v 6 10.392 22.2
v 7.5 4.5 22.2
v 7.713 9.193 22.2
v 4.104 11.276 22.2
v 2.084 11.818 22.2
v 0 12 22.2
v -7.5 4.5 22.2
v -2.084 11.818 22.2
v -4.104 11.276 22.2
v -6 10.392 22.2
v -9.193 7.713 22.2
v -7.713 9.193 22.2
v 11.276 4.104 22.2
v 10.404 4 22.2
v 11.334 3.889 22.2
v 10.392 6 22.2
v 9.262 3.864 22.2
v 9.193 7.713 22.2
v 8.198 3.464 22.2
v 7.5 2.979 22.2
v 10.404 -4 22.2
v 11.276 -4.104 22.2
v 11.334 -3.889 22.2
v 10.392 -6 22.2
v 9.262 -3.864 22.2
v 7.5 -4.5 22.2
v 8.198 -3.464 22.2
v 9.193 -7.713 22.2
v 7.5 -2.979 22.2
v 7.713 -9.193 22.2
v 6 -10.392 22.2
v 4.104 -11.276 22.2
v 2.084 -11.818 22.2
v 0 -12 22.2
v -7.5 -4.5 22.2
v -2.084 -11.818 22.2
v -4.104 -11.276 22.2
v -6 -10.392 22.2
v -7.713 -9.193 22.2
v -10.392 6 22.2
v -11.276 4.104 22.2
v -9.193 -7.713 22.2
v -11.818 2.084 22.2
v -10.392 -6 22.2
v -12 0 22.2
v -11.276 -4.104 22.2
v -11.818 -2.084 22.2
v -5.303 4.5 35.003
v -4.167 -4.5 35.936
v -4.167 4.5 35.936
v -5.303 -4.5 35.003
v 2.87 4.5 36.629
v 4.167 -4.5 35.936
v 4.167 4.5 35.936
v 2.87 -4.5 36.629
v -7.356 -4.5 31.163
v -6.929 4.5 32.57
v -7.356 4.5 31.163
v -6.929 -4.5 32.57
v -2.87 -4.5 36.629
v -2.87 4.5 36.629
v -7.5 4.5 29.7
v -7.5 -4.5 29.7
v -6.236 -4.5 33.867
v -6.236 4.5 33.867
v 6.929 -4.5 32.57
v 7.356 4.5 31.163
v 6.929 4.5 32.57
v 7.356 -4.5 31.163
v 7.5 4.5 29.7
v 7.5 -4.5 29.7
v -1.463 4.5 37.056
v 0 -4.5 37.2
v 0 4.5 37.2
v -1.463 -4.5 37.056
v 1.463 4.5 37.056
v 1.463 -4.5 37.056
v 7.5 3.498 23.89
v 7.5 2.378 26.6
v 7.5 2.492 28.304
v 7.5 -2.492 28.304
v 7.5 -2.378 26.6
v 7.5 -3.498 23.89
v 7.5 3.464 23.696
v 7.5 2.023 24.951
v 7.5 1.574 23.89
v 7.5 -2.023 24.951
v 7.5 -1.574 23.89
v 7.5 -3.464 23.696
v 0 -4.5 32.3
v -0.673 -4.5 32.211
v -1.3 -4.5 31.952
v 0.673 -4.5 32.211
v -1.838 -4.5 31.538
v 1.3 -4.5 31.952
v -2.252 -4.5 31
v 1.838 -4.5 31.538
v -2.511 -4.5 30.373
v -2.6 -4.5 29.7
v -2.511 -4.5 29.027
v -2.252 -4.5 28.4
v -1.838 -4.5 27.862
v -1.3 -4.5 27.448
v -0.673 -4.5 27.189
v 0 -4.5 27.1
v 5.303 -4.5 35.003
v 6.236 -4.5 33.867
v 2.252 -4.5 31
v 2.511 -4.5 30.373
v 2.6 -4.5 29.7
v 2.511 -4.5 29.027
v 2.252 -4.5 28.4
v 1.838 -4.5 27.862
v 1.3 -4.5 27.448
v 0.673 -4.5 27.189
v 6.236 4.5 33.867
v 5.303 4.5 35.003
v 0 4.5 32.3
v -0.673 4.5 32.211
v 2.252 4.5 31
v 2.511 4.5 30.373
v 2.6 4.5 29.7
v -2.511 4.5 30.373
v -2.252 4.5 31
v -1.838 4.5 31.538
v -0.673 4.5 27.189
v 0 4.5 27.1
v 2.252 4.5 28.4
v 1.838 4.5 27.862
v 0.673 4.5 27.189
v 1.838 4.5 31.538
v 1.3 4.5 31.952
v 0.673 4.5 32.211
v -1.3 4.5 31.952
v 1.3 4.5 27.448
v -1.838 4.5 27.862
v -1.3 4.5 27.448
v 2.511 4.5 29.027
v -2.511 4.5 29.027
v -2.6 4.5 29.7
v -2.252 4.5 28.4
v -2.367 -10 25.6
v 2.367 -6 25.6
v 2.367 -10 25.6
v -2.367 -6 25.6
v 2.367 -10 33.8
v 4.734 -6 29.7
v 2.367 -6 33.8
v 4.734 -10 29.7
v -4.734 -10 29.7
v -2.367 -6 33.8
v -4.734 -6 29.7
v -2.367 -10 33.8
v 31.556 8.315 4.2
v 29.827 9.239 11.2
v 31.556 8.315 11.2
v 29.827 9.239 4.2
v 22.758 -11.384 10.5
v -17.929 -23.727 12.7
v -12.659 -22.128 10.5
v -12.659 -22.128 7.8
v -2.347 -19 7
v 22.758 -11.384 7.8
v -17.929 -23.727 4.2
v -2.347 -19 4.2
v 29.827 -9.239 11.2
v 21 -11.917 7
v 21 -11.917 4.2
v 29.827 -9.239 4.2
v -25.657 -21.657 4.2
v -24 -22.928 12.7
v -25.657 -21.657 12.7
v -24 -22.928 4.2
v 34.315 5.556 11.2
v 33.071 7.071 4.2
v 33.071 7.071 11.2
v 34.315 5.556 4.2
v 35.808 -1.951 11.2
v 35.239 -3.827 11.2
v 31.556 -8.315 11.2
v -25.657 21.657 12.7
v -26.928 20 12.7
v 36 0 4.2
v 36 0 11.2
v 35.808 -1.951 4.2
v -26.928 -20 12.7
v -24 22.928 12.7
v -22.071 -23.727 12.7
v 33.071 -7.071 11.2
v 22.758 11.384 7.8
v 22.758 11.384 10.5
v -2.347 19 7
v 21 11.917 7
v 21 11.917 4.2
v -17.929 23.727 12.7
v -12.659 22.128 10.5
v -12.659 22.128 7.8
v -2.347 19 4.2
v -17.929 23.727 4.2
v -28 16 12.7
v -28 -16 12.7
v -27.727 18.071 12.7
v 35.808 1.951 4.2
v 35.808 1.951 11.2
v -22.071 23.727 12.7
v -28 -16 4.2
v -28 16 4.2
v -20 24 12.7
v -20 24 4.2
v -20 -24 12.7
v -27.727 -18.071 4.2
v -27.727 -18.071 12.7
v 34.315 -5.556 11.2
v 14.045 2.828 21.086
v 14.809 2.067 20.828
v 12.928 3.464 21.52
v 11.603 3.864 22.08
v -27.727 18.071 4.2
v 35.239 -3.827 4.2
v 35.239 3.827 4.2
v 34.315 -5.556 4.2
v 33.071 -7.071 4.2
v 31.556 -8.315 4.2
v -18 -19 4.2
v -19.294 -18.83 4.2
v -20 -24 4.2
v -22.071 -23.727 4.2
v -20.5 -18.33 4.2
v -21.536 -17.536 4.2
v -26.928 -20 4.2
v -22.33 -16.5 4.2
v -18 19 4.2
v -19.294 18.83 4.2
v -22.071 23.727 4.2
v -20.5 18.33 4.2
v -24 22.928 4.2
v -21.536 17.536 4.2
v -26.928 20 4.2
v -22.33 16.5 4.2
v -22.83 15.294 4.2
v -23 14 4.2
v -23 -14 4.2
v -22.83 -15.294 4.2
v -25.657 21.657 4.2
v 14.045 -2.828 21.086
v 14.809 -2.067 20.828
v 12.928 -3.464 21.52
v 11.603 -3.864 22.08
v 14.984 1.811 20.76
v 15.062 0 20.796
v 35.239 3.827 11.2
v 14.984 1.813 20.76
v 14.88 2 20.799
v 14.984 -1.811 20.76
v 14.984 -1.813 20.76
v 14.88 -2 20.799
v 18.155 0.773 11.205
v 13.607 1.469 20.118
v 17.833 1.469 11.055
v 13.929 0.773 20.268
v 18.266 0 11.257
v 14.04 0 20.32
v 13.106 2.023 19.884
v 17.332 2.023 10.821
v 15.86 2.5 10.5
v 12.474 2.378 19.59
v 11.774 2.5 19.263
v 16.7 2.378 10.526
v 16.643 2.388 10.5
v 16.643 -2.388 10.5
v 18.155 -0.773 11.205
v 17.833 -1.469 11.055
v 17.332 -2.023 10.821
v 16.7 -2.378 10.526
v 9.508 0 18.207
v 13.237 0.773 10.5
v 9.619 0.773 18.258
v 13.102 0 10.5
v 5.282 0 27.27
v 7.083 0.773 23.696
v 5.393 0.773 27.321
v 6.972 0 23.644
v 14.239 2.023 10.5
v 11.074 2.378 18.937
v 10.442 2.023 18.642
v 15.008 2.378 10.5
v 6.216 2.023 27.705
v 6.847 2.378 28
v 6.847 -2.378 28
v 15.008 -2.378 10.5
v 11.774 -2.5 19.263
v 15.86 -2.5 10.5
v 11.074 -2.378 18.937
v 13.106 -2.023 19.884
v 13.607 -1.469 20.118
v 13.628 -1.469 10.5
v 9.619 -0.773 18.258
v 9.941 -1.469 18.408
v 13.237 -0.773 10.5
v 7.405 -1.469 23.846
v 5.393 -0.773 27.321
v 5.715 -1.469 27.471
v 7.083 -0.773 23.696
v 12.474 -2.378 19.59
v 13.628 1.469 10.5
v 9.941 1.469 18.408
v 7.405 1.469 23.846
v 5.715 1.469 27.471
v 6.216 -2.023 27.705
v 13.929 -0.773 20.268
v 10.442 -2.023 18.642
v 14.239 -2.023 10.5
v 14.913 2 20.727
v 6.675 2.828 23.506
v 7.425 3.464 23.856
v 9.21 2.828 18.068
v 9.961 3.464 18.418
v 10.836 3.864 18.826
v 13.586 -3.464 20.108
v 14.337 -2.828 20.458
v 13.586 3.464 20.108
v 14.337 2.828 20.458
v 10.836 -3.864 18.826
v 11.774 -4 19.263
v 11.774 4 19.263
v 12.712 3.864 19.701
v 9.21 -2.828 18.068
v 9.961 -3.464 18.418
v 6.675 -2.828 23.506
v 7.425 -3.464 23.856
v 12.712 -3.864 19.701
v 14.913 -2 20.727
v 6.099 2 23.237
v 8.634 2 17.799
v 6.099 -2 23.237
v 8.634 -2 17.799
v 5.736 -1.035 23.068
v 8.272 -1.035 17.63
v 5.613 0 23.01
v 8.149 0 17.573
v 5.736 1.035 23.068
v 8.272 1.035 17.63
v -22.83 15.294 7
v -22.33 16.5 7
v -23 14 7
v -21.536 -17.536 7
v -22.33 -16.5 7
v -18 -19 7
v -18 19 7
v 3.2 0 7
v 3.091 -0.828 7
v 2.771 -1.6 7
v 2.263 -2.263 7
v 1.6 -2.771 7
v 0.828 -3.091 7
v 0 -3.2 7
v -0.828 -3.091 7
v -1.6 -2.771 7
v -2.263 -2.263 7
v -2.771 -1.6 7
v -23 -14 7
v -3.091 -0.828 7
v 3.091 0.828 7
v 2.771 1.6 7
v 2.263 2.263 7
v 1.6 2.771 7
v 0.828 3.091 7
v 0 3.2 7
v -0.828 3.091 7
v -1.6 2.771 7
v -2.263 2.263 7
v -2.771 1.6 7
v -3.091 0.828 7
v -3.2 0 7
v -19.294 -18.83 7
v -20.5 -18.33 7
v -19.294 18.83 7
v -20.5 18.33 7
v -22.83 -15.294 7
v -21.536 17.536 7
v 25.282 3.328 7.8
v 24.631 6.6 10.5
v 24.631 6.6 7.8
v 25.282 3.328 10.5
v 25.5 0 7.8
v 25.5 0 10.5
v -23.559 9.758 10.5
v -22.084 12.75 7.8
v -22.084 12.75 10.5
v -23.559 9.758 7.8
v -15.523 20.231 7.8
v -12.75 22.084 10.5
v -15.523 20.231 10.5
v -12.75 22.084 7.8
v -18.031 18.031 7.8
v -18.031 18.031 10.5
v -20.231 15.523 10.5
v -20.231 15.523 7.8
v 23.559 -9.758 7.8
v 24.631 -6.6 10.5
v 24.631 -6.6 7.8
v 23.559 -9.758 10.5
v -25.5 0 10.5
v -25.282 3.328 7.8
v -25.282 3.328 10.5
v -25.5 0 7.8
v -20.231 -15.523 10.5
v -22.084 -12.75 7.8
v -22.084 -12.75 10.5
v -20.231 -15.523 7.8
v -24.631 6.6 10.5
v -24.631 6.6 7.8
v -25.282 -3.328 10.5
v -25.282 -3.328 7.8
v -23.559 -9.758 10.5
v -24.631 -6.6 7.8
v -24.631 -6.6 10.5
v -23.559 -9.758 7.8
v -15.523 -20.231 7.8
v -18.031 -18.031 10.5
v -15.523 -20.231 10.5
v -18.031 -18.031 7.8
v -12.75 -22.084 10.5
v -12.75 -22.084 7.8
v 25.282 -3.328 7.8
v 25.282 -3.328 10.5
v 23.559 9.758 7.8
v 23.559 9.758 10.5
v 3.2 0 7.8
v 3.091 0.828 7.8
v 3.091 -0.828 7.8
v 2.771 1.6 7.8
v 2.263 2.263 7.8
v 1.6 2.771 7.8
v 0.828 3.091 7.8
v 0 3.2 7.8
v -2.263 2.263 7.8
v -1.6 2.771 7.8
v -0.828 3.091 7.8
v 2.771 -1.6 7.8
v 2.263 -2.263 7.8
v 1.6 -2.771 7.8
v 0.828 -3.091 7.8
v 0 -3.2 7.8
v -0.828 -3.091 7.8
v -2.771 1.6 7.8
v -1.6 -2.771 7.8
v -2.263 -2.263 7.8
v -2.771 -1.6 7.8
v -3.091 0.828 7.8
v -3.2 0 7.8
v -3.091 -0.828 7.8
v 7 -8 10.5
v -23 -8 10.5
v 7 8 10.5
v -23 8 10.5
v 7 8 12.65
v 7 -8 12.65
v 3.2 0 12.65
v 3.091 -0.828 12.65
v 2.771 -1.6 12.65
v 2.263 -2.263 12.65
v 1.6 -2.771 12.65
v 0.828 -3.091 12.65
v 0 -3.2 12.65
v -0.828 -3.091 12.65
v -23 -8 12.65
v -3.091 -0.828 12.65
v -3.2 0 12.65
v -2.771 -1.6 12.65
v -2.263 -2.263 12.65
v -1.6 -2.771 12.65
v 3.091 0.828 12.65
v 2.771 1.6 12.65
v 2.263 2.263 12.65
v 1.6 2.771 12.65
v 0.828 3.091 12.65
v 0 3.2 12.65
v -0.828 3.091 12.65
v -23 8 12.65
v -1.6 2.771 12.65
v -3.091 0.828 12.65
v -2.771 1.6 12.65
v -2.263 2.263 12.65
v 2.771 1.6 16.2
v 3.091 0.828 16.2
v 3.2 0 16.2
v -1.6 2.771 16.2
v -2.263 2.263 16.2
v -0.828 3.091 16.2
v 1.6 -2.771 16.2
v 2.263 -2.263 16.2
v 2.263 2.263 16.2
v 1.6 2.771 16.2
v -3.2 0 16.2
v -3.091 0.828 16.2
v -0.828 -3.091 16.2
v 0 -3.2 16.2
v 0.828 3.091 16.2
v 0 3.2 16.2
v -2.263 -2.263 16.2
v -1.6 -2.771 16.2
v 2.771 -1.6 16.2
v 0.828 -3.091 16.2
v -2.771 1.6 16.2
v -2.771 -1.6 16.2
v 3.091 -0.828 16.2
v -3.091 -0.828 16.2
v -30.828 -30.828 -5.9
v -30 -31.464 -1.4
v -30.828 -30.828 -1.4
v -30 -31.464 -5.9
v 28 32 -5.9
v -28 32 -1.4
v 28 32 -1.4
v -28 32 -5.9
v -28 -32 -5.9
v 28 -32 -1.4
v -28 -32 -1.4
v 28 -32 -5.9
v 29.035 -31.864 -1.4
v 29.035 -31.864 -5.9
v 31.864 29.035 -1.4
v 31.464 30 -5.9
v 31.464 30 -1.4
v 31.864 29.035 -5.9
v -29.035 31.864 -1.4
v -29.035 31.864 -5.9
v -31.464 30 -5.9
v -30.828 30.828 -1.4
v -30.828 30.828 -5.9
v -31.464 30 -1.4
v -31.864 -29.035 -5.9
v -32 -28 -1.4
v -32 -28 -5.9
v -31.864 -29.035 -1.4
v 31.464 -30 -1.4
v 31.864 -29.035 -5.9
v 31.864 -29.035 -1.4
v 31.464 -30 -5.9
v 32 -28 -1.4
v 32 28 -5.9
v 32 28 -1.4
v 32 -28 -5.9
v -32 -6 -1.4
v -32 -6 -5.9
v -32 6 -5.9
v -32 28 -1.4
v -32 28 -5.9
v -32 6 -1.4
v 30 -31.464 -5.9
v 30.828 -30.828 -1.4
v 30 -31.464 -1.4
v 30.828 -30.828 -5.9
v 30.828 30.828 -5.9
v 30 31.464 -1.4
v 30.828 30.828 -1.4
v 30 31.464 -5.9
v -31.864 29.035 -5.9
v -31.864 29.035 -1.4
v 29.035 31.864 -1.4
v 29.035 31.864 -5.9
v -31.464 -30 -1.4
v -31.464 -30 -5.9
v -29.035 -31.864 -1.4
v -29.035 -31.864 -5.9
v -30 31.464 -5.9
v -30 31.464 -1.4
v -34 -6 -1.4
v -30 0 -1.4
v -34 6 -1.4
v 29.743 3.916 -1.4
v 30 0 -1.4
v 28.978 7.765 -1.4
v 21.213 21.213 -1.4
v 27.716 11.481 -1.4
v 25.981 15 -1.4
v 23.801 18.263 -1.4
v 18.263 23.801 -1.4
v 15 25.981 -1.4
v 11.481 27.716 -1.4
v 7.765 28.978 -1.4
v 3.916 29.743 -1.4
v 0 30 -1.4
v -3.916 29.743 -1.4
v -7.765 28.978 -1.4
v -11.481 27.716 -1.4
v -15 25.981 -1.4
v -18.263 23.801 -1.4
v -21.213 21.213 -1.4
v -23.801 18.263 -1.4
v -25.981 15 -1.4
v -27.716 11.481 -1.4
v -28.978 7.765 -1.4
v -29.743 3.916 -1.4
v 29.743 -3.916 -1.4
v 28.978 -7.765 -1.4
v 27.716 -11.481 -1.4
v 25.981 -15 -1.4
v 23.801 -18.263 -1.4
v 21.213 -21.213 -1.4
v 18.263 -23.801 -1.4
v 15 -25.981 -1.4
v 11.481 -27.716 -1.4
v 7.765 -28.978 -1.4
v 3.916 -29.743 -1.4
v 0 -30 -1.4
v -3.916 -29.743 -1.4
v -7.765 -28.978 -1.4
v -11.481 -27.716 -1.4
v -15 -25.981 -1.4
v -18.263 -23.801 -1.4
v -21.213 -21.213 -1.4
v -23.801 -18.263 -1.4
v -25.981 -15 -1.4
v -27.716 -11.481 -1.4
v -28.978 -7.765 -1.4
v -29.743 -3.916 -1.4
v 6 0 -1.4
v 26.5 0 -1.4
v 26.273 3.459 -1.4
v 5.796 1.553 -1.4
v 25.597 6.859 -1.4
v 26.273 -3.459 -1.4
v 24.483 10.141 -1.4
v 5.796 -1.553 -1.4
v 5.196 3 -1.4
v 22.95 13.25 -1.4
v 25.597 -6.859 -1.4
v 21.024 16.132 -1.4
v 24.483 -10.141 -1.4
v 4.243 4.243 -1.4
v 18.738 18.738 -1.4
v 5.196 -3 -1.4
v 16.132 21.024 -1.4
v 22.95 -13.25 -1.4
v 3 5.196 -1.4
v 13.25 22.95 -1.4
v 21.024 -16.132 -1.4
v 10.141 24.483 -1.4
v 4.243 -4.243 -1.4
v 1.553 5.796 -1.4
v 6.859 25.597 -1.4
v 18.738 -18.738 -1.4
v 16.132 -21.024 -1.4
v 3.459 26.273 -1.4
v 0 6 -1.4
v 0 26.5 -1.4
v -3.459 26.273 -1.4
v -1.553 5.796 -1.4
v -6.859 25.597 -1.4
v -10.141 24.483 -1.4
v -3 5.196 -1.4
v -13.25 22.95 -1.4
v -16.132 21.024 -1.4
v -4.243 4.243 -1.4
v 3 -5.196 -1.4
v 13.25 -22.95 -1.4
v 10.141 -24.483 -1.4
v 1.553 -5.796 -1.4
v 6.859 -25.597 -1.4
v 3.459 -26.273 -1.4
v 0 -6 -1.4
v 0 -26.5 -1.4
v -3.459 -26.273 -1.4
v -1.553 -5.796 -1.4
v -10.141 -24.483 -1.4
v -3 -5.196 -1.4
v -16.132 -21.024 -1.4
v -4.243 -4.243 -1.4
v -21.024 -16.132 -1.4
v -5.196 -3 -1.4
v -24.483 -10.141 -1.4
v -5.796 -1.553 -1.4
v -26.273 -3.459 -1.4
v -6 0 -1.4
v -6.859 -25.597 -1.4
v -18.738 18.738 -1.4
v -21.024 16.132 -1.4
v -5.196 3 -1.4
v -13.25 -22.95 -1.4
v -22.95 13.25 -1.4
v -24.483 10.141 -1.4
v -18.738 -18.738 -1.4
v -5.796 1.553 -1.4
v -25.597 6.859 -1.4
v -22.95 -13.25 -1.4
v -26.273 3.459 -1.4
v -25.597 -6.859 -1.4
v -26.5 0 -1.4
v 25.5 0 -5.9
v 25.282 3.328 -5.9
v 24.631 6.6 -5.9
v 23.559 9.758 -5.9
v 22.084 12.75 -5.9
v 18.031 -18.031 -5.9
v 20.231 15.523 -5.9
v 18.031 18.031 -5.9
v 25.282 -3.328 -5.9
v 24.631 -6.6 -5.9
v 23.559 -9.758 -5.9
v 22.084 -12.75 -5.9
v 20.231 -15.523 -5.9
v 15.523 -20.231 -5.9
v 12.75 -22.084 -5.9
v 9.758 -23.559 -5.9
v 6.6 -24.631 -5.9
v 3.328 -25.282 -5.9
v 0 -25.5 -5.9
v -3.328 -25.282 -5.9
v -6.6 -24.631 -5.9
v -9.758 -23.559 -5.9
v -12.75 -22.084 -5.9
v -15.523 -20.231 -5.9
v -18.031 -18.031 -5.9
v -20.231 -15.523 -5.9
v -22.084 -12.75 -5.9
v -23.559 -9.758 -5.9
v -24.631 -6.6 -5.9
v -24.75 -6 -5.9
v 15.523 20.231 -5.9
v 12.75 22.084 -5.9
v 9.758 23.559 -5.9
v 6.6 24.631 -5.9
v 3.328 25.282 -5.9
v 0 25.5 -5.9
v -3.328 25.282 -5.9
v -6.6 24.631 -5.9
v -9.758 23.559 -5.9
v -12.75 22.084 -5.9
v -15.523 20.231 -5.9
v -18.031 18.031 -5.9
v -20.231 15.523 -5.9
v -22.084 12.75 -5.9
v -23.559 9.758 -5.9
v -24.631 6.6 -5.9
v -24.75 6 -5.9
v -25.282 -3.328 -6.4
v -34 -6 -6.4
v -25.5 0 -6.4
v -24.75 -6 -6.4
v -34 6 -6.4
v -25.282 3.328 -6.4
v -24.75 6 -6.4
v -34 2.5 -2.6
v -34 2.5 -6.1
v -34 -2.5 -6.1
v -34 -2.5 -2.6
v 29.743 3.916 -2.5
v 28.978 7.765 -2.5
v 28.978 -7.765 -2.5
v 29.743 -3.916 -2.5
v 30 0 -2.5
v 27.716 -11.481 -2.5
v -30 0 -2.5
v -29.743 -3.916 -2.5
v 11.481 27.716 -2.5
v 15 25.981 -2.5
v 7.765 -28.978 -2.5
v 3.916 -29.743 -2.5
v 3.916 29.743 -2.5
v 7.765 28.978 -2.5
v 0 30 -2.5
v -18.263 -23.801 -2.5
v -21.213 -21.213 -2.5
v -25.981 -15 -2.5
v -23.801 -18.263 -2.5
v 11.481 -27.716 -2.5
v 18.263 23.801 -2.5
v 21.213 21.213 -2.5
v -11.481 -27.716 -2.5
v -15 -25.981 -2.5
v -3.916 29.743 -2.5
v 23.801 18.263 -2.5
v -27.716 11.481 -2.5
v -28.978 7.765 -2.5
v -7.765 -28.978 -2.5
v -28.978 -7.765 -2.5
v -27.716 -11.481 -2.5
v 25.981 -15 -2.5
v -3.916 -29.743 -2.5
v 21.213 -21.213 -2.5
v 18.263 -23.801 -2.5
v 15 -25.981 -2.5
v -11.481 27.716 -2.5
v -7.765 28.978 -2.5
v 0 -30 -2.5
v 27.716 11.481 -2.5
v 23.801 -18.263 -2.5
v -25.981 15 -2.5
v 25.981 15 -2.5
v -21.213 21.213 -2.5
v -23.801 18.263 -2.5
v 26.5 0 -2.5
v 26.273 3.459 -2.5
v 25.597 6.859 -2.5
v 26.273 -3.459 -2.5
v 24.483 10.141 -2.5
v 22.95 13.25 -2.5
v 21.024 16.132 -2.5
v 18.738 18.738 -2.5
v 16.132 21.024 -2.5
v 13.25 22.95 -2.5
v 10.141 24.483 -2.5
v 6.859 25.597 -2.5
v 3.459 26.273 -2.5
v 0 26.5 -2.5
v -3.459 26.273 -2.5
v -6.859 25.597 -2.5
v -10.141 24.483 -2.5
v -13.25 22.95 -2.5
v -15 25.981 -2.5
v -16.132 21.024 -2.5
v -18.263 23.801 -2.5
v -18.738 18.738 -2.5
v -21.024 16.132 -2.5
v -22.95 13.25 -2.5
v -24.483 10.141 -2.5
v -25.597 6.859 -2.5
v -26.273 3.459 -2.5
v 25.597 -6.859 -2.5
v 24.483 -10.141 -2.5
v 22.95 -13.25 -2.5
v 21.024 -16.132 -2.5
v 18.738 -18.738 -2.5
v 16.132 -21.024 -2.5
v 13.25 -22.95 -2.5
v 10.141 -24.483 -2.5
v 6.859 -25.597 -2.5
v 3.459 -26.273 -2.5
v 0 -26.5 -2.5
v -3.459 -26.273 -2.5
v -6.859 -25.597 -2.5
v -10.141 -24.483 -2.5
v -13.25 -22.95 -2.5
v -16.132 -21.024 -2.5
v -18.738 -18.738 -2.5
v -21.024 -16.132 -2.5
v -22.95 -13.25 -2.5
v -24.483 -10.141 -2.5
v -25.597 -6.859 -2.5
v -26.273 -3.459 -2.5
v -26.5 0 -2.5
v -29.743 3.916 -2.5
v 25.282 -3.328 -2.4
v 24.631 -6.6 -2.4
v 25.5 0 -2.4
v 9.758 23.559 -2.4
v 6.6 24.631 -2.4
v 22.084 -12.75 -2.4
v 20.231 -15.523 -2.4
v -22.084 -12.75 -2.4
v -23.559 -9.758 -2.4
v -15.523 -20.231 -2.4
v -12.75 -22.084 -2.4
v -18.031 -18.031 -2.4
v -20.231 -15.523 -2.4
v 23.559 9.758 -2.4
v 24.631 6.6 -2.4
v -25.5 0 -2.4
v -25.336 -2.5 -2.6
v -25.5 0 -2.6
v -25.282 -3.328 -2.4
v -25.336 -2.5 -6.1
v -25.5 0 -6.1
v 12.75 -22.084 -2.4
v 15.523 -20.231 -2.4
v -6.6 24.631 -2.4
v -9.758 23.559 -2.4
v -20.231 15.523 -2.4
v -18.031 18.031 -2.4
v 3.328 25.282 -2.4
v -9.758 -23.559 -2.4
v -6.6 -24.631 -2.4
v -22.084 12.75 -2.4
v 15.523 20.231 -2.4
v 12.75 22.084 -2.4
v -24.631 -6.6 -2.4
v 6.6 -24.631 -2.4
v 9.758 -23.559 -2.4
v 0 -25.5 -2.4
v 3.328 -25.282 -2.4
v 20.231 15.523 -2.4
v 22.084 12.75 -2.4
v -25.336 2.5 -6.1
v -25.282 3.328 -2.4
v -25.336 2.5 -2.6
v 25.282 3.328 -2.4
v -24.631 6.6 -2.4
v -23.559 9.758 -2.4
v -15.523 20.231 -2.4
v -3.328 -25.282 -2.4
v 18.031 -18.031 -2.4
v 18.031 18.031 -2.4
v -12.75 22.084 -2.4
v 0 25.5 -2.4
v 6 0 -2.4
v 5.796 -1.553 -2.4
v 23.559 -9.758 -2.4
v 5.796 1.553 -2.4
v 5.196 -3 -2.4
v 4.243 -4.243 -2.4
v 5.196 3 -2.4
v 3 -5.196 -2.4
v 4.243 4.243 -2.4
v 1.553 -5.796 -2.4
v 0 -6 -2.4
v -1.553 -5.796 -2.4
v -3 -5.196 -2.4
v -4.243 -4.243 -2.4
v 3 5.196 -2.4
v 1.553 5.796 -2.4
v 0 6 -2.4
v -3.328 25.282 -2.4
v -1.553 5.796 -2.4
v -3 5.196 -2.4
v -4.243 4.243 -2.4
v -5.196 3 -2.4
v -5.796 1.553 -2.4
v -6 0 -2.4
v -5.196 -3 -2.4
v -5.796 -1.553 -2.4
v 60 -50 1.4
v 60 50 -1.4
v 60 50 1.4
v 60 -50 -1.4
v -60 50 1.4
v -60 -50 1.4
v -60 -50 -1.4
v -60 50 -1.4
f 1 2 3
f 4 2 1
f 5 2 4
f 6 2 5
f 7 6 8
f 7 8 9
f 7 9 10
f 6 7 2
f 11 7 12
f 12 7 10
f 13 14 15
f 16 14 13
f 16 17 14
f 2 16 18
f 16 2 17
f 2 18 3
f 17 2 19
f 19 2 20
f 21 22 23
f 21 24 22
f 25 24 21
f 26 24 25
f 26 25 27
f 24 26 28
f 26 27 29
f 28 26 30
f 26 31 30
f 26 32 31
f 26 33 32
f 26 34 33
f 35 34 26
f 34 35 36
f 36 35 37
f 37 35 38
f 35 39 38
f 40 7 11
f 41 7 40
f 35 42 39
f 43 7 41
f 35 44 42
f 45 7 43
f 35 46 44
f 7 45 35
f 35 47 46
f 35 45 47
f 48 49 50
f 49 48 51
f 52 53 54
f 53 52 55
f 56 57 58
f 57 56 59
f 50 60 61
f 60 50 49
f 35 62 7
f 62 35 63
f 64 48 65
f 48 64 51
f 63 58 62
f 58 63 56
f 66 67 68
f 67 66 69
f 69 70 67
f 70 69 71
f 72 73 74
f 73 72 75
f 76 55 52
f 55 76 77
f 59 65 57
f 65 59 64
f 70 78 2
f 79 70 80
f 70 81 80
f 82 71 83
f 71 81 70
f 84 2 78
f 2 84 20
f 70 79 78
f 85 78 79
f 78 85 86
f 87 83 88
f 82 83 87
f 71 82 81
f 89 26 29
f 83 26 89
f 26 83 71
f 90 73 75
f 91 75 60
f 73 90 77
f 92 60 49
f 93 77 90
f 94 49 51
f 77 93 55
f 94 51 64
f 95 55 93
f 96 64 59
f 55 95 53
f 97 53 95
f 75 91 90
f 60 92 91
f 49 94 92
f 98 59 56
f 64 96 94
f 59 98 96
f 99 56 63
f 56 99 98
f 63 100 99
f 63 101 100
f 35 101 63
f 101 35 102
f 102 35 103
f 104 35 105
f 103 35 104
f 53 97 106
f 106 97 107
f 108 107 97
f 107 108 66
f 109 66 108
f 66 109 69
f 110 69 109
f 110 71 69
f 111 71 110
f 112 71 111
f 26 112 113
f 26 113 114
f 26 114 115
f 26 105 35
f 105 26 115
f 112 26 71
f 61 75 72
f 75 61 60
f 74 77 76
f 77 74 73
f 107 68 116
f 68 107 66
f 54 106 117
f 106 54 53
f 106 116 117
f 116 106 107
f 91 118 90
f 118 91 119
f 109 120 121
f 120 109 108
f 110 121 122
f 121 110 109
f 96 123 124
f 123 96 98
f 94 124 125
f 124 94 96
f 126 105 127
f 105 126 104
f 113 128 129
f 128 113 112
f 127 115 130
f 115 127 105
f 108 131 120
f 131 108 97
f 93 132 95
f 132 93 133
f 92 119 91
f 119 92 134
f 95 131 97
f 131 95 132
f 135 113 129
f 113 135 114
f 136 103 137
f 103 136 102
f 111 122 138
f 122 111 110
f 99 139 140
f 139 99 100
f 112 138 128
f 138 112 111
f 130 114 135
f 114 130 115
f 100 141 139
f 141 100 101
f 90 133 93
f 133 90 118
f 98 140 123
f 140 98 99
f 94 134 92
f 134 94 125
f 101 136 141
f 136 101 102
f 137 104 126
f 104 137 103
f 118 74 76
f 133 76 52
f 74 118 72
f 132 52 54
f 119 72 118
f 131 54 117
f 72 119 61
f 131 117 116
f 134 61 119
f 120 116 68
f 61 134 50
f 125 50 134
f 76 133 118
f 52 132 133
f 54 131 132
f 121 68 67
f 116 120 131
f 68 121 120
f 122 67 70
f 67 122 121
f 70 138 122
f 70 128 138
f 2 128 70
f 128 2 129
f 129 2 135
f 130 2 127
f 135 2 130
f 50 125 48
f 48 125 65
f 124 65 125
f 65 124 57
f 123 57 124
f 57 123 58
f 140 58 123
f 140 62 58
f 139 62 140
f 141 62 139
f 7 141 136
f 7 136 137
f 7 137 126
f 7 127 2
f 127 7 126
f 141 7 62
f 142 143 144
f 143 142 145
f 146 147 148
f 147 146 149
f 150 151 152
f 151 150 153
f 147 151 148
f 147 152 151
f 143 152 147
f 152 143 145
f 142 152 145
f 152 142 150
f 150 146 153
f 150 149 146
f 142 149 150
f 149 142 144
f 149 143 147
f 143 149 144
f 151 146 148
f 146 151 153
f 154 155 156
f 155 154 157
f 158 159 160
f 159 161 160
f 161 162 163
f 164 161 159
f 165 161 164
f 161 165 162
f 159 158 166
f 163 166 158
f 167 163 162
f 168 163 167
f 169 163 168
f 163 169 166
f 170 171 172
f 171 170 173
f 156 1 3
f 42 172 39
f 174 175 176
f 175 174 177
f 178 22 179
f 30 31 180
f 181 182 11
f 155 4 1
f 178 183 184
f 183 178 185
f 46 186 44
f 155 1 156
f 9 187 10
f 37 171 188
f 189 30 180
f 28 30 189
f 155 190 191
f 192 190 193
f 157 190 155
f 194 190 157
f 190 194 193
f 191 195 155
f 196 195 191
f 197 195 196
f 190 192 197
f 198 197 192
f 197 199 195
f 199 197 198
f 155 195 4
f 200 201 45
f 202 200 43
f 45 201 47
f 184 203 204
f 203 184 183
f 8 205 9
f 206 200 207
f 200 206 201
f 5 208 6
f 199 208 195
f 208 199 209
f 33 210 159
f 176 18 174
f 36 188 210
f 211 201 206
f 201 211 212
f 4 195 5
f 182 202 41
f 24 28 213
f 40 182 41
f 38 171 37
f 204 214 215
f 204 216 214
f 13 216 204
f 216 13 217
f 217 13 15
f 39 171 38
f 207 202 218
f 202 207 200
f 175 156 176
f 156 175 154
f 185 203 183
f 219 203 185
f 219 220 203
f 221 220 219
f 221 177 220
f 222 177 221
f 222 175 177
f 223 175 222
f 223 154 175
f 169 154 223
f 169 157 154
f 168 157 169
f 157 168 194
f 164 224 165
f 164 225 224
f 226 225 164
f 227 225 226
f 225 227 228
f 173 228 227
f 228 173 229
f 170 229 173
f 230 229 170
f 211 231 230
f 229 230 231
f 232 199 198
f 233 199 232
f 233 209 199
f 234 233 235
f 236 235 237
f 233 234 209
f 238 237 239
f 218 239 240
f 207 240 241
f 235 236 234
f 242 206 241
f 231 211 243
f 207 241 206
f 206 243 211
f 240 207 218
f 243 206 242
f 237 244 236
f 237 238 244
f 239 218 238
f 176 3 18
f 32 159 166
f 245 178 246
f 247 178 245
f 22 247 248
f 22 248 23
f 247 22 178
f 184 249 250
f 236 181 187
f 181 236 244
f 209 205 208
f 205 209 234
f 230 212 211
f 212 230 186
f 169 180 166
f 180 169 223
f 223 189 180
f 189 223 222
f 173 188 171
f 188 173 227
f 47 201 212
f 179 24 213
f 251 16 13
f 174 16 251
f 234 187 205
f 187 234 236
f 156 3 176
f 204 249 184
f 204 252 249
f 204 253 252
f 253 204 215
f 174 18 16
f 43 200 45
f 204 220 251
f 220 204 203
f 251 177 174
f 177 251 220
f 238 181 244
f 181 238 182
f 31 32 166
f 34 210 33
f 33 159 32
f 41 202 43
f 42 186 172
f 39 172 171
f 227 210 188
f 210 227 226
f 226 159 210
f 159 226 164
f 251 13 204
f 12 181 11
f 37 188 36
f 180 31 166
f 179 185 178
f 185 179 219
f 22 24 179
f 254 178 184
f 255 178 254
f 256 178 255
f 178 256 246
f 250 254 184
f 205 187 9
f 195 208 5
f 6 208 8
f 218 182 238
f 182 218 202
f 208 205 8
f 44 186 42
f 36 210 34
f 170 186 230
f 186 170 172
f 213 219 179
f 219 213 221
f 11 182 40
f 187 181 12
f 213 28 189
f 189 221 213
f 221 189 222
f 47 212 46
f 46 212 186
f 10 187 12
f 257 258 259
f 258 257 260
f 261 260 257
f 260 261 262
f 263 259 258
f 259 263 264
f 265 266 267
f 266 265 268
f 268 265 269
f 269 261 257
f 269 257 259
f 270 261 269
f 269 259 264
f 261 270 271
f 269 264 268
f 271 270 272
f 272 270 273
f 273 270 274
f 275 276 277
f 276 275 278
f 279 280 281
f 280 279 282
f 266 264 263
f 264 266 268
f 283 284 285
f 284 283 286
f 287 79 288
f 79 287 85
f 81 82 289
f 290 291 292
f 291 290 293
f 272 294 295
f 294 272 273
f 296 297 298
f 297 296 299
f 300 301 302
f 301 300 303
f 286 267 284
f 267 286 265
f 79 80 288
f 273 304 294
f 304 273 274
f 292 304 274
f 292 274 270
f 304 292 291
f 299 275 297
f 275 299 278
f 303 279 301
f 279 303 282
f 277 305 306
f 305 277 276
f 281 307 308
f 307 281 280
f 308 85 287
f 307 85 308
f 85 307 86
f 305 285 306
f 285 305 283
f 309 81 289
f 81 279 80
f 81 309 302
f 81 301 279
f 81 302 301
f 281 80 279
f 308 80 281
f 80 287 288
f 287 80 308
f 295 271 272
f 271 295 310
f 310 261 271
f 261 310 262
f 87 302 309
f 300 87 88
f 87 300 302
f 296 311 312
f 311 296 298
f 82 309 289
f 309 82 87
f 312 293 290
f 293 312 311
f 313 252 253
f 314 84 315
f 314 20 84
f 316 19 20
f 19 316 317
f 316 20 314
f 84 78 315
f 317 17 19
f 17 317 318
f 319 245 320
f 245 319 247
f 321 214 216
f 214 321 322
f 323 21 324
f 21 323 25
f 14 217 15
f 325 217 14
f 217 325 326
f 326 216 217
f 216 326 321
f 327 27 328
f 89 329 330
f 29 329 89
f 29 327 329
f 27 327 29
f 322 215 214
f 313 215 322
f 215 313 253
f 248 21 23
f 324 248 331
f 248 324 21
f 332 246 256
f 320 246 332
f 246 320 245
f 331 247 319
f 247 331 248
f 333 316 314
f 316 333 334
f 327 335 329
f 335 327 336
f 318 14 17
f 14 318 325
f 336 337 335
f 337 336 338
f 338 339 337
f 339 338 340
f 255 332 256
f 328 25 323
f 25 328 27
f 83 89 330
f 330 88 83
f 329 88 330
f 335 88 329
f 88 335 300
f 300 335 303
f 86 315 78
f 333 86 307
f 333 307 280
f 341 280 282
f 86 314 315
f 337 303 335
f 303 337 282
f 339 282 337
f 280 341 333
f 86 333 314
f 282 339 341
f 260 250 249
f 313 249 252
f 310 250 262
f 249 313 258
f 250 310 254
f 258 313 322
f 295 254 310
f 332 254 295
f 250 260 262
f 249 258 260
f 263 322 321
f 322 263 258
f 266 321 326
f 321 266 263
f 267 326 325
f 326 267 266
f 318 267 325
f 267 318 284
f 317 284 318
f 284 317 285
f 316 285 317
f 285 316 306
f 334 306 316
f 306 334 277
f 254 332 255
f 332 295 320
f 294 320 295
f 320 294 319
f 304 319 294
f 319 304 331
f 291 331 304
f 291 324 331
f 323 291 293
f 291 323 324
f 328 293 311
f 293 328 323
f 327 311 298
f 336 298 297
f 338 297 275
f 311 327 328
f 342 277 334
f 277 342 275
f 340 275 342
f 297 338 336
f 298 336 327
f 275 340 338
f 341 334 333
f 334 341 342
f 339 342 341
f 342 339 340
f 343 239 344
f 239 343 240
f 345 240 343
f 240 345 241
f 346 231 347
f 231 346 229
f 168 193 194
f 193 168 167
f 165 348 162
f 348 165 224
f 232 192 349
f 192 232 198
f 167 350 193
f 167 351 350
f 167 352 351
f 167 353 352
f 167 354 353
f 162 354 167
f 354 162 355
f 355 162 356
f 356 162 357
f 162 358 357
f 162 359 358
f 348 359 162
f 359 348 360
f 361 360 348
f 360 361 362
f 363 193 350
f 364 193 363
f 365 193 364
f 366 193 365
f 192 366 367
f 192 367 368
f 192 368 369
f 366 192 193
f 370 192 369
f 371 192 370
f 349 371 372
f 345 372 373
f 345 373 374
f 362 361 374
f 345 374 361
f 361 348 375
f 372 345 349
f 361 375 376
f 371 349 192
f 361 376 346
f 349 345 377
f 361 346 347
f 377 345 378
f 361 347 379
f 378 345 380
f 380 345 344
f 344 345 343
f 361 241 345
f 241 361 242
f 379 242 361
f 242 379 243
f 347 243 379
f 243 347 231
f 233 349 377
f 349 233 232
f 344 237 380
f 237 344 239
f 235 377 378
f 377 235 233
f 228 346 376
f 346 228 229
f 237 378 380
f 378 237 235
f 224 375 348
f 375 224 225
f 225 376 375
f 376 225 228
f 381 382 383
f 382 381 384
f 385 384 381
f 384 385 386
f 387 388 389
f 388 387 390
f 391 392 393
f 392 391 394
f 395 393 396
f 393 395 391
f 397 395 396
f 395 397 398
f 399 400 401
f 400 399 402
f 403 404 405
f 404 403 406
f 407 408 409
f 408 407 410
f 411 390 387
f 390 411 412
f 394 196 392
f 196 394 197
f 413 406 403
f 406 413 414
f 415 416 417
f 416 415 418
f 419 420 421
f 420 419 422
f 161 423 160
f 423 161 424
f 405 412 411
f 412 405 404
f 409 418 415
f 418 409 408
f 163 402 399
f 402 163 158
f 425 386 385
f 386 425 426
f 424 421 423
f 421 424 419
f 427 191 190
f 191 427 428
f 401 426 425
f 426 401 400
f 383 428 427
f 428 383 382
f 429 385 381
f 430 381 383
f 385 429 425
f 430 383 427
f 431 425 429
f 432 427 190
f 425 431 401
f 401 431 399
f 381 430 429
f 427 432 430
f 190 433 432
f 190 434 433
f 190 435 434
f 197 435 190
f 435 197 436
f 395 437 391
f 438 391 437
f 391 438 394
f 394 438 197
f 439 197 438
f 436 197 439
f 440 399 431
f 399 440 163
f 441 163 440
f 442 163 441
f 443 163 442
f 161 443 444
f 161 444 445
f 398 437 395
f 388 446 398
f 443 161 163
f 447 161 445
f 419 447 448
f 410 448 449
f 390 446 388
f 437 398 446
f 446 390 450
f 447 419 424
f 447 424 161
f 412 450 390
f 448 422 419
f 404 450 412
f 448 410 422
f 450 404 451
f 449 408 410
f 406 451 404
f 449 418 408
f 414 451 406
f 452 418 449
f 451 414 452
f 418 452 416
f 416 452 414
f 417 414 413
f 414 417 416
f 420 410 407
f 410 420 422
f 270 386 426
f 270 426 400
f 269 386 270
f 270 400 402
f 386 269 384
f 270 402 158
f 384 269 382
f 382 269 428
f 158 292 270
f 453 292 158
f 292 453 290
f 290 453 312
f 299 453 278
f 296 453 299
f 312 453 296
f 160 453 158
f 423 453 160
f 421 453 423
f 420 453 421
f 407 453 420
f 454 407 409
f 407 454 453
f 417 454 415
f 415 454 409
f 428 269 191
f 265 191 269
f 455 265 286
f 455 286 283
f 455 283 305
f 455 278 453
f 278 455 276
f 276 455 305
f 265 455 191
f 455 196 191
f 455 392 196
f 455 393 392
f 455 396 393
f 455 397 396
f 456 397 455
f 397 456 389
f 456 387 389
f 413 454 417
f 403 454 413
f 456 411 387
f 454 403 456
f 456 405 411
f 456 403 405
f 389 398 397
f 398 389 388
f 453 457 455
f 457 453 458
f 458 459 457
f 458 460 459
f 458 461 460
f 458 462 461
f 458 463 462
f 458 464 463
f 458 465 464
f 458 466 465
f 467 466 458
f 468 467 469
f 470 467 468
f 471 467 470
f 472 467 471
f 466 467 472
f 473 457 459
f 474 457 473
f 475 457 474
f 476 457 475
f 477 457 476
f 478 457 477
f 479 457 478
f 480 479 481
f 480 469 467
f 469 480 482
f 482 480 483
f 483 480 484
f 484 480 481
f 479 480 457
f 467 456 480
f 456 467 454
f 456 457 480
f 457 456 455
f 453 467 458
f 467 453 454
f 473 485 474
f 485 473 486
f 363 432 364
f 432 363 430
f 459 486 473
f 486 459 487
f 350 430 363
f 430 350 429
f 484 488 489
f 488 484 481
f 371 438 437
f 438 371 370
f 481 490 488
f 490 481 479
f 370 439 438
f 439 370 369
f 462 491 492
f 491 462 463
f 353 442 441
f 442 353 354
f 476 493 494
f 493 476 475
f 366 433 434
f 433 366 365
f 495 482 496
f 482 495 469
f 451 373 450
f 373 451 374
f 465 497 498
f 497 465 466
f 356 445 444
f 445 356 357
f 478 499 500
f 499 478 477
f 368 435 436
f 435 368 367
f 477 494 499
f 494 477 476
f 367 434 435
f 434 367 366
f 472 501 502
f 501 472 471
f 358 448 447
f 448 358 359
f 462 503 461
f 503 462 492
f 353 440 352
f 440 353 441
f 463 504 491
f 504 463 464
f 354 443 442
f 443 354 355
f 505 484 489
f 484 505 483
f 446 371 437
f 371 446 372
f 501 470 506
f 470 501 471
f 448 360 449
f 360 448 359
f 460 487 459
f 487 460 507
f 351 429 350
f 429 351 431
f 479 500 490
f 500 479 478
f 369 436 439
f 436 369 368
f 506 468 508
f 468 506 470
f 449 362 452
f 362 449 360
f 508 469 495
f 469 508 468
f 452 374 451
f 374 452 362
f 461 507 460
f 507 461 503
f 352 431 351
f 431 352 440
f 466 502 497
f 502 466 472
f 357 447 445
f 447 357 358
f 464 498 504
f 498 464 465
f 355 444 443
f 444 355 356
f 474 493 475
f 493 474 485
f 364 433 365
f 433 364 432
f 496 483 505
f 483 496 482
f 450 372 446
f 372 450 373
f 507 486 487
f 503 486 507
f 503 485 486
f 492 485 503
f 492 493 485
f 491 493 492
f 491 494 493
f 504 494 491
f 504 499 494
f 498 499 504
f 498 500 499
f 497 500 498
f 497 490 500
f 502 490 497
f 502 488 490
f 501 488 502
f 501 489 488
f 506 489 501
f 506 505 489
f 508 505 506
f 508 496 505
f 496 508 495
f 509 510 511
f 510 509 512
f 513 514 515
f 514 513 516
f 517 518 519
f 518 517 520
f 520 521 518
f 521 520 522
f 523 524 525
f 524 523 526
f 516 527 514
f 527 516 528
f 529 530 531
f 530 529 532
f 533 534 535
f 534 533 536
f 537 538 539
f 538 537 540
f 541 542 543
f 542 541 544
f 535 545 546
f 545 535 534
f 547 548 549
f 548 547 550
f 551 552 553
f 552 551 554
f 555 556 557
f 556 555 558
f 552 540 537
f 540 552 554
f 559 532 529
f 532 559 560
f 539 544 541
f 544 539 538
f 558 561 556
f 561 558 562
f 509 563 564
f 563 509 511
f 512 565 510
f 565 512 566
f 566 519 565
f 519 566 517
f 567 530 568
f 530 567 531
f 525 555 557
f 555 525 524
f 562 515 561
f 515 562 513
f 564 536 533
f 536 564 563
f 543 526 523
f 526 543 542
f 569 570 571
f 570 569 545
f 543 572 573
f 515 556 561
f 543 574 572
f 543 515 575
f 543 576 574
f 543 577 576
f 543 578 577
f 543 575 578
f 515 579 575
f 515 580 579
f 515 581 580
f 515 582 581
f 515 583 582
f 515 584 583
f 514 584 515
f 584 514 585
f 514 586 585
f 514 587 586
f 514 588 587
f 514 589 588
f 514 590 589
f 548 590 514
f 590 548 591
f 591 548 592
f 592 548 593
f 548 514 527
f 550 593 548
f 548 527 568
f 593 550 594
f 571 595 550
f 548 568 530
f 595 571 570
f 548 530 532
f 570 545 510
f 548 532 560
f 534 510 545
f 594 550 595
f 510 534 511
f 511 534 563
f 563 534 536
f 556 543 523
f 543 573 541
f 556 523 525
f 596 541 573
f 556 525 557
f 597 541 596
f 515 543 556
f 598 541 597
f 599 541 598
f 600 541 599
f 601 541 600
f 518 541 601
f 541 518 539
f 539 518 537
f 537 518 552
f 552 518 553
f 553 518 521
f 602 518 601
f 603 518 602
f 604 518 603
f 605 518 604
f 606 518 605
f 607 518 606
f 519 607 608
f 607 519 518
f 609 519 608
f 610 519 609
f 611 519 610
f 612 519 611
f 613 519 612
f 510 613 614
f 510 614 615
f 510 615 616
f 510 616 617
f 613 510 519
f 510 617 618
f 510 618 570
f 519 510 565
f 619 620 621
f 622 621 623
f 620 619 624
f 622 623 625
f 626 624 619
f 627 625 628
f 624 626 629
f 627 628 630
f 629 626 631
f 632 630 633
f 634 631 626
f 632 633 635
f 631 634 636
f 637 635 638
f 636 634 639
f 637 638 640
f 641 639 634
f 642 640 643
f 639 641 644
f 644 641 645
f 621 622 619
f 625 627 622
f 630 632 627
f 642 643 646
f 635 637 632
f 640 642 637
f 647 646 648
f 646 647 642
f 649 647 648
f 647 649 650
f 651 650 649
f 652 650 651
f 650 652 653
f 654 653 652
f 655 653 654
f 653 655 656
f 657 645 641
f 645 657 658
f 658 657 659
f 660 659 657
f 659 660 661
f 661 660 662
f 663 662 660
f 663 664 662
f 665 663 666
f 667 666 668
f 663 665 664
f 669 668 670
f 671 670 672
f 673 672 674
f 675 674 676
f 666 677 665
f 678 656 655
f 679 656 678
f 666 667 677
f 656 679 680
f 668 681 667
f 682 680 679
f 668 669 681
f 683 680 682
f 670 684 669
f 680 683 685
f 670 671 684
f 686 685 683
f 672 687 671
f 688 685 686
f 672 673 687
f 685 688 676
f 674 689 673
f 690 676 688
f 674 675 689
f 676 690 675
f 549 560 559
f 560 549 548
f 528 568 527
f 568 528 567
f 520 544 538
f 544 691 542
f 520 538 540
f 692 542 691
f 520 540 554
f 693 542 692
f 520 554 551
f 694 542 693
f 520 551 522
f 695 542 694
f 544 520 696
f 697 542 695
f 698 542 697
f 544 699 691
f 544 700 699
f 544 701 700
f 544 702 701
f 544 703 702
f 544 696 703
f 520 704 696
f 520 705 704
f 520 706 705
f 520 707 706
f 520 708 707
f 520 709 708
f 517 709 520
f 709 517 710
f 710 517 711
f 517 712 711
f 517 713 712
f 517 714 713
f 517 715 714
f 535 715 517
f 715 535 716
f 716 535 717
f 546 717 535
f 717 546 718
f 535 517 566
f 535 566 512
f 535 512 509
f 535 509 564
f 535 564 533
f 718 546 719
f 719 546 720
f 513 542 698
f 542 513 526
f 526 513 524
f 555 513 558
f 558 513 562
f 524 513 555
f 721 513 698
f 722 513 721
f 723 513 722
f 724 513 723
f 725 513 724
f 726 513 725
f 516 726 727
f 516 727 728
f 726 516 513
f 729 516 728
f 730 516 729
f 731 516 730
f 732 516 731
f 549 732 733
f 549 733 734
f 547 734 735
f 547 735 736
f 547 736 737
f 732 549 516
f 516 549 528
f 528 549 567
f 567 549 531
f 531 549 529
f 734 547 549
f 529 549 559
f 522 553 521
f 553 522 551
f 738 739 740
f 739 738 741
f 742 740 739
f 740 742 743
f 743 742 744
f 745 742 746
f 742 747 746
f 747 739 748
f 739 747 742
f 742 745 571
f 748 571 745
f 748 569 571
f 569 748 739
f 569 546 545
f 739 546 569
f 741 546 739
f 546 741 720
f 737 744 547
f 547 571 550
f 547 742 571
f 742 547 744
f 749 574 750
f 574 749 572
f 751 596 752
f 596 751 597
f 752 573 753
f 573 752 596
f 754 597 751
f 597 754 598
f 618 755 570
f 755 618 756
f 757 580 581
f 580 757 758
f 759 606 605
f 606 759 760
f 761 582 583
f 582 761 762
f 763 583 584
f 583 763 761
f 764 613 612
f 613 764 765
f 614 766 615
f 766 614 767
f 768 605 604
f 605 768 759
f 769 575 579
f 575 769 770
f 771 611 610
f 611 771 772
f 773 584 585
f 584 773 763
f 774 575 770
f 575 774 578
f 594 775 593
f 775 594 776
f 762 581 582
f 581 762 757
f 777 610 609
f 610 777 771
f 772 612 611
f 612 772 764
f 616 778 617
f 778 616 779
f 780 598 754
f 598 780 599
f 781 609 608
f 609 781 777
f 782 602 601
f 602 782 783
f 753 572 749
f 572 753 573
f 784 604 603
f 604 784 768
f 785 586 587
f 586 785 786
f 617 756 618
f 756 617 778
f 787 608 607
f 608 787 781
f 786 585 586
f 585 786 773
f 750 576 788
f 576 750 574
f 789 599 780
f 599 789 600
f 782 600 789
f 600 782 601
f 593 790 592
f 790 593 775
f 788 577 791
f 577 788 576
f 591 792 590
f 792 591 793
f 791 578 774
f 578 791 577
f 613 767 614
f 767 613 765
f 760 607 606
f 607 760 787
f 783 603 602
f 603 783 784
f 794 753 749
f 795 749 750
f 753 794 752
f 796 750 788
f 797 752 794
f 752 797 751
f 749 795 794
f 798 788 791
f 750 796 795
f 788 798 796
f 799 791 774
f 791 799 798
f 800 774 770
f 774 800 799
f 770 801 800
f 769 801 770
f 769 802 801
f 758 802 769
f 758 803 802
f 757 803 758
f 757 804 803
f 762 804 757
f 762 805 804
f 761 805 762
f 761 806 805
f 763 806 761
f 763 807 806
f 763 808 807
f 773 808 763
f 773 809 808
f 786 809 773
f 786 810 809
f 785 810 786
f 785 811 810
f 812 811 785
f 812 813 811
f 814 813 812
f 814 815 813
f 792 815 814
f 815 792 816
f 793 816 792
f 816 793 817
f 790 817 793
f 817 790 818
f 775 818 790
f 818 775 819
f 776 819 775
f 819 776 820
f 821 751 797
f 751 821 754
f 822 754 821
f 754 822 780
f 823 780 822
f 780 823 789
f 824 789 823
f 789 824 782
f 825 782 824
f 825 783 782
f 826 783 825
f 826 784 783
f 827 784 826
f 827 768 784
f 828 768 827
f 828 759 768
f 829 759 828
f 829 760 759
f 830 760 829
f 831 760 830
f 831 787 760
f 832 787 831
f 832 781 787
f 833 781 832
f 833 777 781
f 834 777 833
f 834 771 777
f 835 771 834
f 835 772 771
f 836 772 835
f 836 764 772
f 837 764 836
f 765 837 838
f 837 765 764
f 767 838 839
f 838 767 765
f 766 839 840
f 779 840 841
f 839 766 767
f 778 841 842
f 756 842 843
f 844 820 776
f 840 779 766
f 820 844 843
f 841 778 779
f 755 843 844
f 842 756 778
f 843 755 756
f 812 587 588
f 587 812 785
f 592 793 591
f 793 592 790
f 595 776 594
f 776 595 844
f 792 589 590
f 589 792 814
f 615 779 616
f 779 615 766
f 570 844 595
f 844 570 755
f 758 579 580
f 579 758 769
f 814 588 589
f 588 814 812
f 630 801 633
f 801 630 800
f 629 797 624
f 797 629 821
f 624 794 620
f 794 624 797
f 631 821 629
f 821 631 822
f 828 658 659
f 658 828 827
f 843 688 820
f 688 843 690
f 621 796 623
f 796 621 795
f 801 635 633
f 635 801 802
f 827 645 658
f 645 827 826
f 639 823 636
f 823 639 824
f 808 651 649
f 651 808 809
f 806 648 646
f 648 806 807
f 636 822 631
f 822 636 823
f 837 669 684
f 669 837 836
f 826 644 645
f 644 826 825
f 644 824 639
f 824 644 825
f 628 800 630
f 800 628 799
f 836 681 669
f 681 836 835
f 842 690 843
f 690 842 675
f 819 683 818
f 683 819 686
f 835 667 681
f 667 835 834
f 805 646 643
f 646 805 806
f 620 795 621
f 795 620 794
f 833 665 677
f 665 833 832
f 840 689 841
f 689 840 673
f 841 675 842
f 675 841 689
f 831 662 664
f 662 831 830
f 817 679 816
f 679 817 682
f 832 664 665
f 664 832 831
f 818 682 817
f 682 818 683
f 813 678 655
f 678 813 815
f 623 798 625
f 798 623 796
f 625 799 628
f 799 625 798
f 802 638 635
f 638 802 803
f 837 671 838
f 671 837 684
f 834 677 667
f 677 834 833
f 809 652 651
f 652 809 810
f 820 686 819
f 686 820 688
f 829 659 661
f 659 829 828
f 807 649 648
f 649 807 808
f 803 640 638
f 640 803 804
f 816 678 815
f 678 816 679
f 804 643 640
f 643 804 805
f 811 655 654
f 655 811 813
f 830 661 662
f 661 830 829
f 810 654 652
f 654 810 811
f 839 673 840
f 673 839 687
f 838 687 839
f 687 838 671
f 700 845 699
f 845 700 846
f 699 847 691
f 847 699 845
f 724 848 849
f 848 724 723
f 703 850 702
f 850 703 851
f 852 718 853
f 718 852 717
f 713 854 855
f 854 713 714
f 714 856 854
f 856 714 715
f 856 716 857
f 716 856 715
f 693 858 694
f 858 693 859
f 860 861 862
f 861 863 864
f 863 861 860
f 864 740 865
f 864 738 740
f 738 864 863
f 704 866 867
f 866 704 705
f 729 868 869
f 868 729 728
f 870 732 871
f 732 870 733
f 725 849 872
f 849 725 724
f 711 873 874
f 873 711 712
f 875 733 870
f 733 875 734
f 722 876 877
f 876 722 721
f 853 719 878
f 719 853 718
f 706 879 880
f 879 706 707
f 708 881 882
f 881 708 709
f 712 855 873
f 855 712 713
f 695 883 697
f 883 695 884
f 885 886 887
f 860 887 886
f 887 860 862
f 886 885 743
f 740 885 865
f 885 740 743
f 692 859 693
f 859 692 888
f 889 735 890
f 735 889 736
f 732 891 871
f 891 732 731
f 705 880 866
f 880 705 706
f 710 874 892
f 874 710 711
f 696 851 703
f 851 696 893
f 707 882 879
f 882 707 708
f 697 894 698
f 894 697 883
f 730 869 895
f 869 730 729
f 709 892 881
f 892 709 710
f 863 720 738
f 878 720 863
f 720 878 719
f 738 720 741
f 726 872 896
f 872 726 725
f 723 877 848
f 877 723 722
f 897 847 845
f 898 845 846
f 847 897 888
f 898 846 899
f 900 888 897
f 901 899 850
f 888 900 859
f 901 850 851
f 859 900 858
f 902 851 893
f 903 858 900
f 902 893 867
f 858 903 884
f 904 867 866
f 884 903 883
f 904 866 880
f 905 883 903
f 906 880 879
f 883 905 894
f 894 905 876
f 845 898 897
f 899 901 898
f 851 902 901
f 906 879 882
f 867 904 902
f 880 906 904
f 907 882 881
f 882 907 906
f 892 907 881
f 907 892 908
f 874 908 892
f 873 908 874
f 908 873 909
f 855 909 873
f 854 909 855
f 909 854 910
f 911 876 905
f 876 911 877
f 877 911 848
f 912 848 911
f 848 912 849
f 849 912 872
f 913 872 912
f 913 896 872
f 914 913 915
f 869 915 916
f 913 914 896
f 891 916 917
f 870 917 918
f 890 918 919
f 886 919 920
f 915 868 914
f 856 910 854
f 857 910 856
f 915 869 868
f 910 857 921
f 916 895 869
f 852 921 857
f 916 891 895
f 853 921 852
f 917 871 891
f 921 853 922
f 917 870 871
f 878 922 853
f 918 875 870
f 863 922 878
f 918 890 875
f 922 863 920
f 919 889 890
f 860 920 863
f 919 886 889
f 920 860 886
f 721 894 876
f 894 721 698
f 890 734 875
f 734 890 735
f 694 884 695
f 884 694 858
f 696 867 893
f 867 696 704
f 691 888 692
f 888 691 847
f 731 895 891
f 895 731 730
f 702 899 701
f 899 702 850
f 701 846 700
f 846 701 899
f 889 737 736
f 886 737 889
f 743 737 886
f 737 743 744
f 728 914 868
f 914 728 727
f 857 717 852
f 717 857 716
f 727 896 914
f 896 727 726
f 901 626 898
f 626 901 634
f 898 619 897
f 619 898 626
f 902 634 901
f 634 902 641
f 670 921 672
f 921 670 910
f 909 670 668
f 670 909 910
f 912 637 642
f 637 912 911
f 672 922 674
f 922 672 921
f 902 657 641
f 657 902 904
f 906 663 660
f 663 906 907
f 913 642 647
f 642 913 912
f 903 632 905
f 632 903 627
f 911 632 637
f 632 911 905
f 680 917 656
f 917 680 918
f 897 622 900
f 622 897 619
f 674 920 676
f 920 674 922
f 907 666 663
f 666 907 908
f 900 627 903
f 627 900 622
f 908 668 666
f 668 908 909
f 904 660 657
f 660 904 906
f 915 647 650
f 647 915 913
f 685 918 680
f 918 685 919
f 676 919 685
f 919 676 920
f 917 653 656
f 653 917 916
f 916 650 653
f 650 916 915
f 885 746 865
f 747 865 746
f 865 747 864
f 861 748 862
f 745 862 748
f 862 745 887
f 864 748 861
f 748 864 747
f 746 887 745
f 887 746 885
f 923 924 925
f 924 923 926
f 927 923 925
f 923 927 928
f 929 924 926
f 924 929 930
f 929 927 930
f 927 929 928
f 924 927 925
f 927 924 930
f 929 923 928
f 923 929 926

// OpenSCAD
// =============================================================================
// OpenMotorBridge - Road Glide ST Through-Fairing Inductive Cam Dock (Qi IPT)
// =============================================================================
// File: hardware/cad/scad/05_accessories/road_glide_inductive_cam_dock.scad
// Description: Zero-drill, zero-external-wire continuous power docking system
//              for action cams (Insta360 X3/X4, GoPro) on Harley Sharknose fairings:
//              1. Inner TX Cradle (mounted under outer fairing deck behind headlamp)
//                 holds 15W Qi transmitter coil pressed against inner ABS surface.
//              2. Outer Cam Dock with 3M Dual Lock SJ3550 base, internal Qi RX coil
//                 (TI BQ51013B 5V/2A), 30mm ultra-short USB-C pigtail to camera,
//                 and universal 3-prong action-cam / 1/4"-20 tripod mounting head.
//              3. Pure magnetic inductive coupling through 2.5 - 3.0 mm ABS deck.
//                 100% factory paint preserved, 100% weatherproof, zero holes!
// =============================================================================

include <../00_common/parameters.scad>;

// --- Fairing & Electromagnetic Parameters ---
FAIRING_ABS_THICK   = 2.8;   // Nominal Road Glide ST outer fairing deck thickness (mm)
QI_COIL_DIA         = 50.0;  // Standard 15W Qi inductive ferrite coil diameter (mm)
QI_COIL_THICK       = 2.2;   // Coil + ferrite shield backing thickness (mm)
QI_RX_PCB_L         = 28.0;  // Rectifier / step-down converter board length (mm)
QI_RX_PCB_W         = 15.0;  // Rectifier board width (mm)

// --- Outer Dock Mechanical Parameters ---
DOCK_OUTER_L        = 64.0;  // Longitudinal length of aerodynamic dock base (mm)
DOCK_OUTER_W        = 56.0;  // Transverse width of dock base (mm)
DOCK_OUTER_H        = 18.0;  // Overall height from fairing deck to camera pivot (mm)
DUAL_LOCK_RECESS_D  = 2.8;   // Recess depth for 3M Dual Lock SJ3550 interlocking tape (mm)

// 1. Inner TX Coil Cradle (Glued inside fairing deck behind headlamp)
module road_glide_inner_qi_tx_cradle() {
    difference() {
        union() {
            // Mounting flange plate with rounded corners
            hull() {
                for (dx = [-28.0, 28.0]) {
                    for (dy = [-28.0, 28.0]) {
                        translate([dx, dy, 0])
                            cylinder(r=4.0, h=4.5, center=false, $fn=24);
                    }
                }
            }
            // Cable strain relief snout
            translate([-34.0, -6.0, 0])
                cube([12.0, 12.0, 5.0], center=false);
        }

        // Circular pocket for 15W Qi TX coil + ferrite disc
        translate([0, 0, 1.0])
            cylinder(r=QI_COIL_DIA/2.0 + 0.5, h=QI_COIL_THICK + 2.0, center=false, $fn=48);

        // Center thermal breather / alignment port
        cylinder(r=6.0, h=10.0, center=true, $fn=24);

        // Power wire routing groove to Front-Node Port 1 (PD 12V/9V)
        translate([-36.0, -2.5, 1.2])
            cube([25.0, 5.0, 3.5], center=false);

        // Perimeter 3M VHB bonding adhesive tape channels (1.0 mm deep)
        difference() {
            translate([0, 0, -0.1])
                cylinder(r=30.0, h=1.2, center=false, $fn=48);
            translate([0, 0, -0.2])
                cylinder(r=26.5, h=1.5, center=false, $fn=48);
        }
    }
}

// 2. Outer Quick-Release Inductive Action Cam Dock
module road_glide_outer_qi_cam_dock() {
    difference() {
        union() {
            // Aerodynamic teardrop / rounded wedge outer housing
            hull() {
                // Front aerodynamic nose
                translate([DOCK_OUTER_L/2.0 - 6.0, 0, 0])
                    cylinder(r=10.0, h=7.0, center=false, $fn=32);
                // Rear body
                translate([-DOCK_OUTER_L/2.0 + 12.0, -DOCK_OUTER_W/2.0 + 12.0, 0])
                    cylinder(r=8.0, h=8.5, center=false, $fn=24);
                translate([-DOCK_OUTER_L/2.0 + 12.0,  DOCK_OUTER_W/2.0 - 12.0, 0])
                    cylinder(r=8.0, h=8.5, center=false, $fn=24);
                // Upper camera mounting tower
                translate([0, 0, DOCK_OUTER_H - 4.0])
                    cylinder(r=12.0, h=4.0, center=false, $fn=36);
            }

            // Universal Action Camera 3-Prong Mounting Clevis
            translate([0, 0, DOCK_OUTER_H]) {
                for (prong_y = [-4.5, 1.5]) {
                    translate([-7.5, prong_y, 0]) {
                        difference() {
                            hull() {
                                cube([15.0, 3.0, 7.5], center=false);
                                translate([7.5, 1.5, 7.5])
                                    rotate([90, 0, 0])
                                        cylinder(r=7.5, h=3.0, center=true, $fn=32);
                            }
                            // M5 Bolt Pivot Bore
                            translate([7.5, 1.5, 7.5])
                                rotate([90, 0, 0])
                                    cylinder(r=2.6, h=6.0, center=true, $fn=24);
                        }
                    }
                }
                // Center prong
                translate([-7.5, -1.5, 0]) {
                    difference() {
                        hull() {
                            cube([15.0, 3.0, 7.5], center=false);
                            translate([7.5, 1.5, 7.5])
                                rotate([90, 0, 0])
                                    cylinder(r=7.5, h=3.0, center=true, $fn=32);
                        }
                        translate([7.5, 1.5, 7.5])
                            rotate([90, 0, 0])
                                cylinder(r=2.6, h=6.0, center=true, $fn=24);
                    }
                }
                // M5 Acorn Nut Captive Hex Pocket (on left flank)
                translate([0, -8.0, 7.5])
                    rotate([90, 0, 0])
                        cylinder(r=NUT_M5_SW/cos(30)/2, h=4.0, center=true, $fn=6);
            }
        }

        // --- SUBTRACTIONS ---

        // A. Bottom 3M Dual Lock SJ3550 Interlocking Tape Recess (ensures flush mount)
        translate([0, 0, -0.1]) {
            hull() {
                for (dx = [-DOCK_OUTER_L/2.0 + 14.0, DOCK_OUTER_L/2.0 - 16.0]) {
                    for (dy = [-DOCK_OUTER_W/2.0 + 14.0, DOCK_OUTER_W/2.0 - 14.0]) {
                        translate([dx, dy, 0])
                            cylinder(r=5.0, h=DUAL_LOCK_RECESS_D + 0.1, center=false, $fn=24);
                    }
                }
            }
        }

        // B. Internal Qi Receiver Coil Cavity (centered right above Dual Lock floor)
        translate([0, 0, DUAL_LOCK_RECESS_D + 0.8])
            cylinder(r=QI_COIL_DIA/2.0 + 0.5, h=QI_COIL_THICK + 0.5, center=false, $fn=48);

        // C. Internal Rectifier & 5V/2A Step-Down PCB Pocket (TI BQ51013B)
        translate([-8.0, 0, DUAL_LOCK_RECESS_D + QI_COIL_THICK + 1.2])
            cube([QI_RX_PCB_L + 2.0, QI_RX_PCB_W + 1.0, 4.5], center=true);

        // D. Ultra-Short 30mm USB-C Cable Exit Port (Angled upward towards camera port)
        translate([16.0, 0, 6.0]) {
            rotate([0, -25, 0]) {
                cylinder(r=2.5, h=20.0, center=false, $fn=20); // Ø 5mm cable passage
                translate([0, 0, 10.0])
                    cylinder(r=4.0, h=6.0, center=false, $fn=24); // TPU strain relief boot recess
            }
        }

        // E. Standard 1/4"-20 Threaded Brass Bushing Option (Alternative to GoPro prongs)
        translate([0, 0, 2.0])
            cylinder(r=3.2, h=10.0, center=false, $fn=24);
    }
}

// 3. Full Through-Fairing Coupled Assembly (Visualization)
module road_glide_through_fairing_assembly() {
    // A. Outer Action Cam Dock (Molded Matte Black PA12)
    color("darkslategray", 0.95)
        translate([0, 0, FAIRING_ABS_THICK/2.0 + DUAL_LOCK_RECESS_D])
            road_glide_outer_qi_cam_dock();

    // B. Harley Road Glide Sharknose Fairing Deck (Representation in Amber ABS)
    color("darkorange", 0.35)
        translate([0, 0, 0])
            cube([120.0, 100.0, FAIRING_ABS_THICK], center=true);

    // C. Inner Qi 15W TX Coil Cradle (Mounted on underside)
    color("dimgray", 0.9)
        translate([0, 0, -FAIRING_ABS_THICK/2.0])
            rotate([180, 0, 0])
                road_glide_inner_qi_tx_cradle();
}

road_glide_through_fairing_assembly();
